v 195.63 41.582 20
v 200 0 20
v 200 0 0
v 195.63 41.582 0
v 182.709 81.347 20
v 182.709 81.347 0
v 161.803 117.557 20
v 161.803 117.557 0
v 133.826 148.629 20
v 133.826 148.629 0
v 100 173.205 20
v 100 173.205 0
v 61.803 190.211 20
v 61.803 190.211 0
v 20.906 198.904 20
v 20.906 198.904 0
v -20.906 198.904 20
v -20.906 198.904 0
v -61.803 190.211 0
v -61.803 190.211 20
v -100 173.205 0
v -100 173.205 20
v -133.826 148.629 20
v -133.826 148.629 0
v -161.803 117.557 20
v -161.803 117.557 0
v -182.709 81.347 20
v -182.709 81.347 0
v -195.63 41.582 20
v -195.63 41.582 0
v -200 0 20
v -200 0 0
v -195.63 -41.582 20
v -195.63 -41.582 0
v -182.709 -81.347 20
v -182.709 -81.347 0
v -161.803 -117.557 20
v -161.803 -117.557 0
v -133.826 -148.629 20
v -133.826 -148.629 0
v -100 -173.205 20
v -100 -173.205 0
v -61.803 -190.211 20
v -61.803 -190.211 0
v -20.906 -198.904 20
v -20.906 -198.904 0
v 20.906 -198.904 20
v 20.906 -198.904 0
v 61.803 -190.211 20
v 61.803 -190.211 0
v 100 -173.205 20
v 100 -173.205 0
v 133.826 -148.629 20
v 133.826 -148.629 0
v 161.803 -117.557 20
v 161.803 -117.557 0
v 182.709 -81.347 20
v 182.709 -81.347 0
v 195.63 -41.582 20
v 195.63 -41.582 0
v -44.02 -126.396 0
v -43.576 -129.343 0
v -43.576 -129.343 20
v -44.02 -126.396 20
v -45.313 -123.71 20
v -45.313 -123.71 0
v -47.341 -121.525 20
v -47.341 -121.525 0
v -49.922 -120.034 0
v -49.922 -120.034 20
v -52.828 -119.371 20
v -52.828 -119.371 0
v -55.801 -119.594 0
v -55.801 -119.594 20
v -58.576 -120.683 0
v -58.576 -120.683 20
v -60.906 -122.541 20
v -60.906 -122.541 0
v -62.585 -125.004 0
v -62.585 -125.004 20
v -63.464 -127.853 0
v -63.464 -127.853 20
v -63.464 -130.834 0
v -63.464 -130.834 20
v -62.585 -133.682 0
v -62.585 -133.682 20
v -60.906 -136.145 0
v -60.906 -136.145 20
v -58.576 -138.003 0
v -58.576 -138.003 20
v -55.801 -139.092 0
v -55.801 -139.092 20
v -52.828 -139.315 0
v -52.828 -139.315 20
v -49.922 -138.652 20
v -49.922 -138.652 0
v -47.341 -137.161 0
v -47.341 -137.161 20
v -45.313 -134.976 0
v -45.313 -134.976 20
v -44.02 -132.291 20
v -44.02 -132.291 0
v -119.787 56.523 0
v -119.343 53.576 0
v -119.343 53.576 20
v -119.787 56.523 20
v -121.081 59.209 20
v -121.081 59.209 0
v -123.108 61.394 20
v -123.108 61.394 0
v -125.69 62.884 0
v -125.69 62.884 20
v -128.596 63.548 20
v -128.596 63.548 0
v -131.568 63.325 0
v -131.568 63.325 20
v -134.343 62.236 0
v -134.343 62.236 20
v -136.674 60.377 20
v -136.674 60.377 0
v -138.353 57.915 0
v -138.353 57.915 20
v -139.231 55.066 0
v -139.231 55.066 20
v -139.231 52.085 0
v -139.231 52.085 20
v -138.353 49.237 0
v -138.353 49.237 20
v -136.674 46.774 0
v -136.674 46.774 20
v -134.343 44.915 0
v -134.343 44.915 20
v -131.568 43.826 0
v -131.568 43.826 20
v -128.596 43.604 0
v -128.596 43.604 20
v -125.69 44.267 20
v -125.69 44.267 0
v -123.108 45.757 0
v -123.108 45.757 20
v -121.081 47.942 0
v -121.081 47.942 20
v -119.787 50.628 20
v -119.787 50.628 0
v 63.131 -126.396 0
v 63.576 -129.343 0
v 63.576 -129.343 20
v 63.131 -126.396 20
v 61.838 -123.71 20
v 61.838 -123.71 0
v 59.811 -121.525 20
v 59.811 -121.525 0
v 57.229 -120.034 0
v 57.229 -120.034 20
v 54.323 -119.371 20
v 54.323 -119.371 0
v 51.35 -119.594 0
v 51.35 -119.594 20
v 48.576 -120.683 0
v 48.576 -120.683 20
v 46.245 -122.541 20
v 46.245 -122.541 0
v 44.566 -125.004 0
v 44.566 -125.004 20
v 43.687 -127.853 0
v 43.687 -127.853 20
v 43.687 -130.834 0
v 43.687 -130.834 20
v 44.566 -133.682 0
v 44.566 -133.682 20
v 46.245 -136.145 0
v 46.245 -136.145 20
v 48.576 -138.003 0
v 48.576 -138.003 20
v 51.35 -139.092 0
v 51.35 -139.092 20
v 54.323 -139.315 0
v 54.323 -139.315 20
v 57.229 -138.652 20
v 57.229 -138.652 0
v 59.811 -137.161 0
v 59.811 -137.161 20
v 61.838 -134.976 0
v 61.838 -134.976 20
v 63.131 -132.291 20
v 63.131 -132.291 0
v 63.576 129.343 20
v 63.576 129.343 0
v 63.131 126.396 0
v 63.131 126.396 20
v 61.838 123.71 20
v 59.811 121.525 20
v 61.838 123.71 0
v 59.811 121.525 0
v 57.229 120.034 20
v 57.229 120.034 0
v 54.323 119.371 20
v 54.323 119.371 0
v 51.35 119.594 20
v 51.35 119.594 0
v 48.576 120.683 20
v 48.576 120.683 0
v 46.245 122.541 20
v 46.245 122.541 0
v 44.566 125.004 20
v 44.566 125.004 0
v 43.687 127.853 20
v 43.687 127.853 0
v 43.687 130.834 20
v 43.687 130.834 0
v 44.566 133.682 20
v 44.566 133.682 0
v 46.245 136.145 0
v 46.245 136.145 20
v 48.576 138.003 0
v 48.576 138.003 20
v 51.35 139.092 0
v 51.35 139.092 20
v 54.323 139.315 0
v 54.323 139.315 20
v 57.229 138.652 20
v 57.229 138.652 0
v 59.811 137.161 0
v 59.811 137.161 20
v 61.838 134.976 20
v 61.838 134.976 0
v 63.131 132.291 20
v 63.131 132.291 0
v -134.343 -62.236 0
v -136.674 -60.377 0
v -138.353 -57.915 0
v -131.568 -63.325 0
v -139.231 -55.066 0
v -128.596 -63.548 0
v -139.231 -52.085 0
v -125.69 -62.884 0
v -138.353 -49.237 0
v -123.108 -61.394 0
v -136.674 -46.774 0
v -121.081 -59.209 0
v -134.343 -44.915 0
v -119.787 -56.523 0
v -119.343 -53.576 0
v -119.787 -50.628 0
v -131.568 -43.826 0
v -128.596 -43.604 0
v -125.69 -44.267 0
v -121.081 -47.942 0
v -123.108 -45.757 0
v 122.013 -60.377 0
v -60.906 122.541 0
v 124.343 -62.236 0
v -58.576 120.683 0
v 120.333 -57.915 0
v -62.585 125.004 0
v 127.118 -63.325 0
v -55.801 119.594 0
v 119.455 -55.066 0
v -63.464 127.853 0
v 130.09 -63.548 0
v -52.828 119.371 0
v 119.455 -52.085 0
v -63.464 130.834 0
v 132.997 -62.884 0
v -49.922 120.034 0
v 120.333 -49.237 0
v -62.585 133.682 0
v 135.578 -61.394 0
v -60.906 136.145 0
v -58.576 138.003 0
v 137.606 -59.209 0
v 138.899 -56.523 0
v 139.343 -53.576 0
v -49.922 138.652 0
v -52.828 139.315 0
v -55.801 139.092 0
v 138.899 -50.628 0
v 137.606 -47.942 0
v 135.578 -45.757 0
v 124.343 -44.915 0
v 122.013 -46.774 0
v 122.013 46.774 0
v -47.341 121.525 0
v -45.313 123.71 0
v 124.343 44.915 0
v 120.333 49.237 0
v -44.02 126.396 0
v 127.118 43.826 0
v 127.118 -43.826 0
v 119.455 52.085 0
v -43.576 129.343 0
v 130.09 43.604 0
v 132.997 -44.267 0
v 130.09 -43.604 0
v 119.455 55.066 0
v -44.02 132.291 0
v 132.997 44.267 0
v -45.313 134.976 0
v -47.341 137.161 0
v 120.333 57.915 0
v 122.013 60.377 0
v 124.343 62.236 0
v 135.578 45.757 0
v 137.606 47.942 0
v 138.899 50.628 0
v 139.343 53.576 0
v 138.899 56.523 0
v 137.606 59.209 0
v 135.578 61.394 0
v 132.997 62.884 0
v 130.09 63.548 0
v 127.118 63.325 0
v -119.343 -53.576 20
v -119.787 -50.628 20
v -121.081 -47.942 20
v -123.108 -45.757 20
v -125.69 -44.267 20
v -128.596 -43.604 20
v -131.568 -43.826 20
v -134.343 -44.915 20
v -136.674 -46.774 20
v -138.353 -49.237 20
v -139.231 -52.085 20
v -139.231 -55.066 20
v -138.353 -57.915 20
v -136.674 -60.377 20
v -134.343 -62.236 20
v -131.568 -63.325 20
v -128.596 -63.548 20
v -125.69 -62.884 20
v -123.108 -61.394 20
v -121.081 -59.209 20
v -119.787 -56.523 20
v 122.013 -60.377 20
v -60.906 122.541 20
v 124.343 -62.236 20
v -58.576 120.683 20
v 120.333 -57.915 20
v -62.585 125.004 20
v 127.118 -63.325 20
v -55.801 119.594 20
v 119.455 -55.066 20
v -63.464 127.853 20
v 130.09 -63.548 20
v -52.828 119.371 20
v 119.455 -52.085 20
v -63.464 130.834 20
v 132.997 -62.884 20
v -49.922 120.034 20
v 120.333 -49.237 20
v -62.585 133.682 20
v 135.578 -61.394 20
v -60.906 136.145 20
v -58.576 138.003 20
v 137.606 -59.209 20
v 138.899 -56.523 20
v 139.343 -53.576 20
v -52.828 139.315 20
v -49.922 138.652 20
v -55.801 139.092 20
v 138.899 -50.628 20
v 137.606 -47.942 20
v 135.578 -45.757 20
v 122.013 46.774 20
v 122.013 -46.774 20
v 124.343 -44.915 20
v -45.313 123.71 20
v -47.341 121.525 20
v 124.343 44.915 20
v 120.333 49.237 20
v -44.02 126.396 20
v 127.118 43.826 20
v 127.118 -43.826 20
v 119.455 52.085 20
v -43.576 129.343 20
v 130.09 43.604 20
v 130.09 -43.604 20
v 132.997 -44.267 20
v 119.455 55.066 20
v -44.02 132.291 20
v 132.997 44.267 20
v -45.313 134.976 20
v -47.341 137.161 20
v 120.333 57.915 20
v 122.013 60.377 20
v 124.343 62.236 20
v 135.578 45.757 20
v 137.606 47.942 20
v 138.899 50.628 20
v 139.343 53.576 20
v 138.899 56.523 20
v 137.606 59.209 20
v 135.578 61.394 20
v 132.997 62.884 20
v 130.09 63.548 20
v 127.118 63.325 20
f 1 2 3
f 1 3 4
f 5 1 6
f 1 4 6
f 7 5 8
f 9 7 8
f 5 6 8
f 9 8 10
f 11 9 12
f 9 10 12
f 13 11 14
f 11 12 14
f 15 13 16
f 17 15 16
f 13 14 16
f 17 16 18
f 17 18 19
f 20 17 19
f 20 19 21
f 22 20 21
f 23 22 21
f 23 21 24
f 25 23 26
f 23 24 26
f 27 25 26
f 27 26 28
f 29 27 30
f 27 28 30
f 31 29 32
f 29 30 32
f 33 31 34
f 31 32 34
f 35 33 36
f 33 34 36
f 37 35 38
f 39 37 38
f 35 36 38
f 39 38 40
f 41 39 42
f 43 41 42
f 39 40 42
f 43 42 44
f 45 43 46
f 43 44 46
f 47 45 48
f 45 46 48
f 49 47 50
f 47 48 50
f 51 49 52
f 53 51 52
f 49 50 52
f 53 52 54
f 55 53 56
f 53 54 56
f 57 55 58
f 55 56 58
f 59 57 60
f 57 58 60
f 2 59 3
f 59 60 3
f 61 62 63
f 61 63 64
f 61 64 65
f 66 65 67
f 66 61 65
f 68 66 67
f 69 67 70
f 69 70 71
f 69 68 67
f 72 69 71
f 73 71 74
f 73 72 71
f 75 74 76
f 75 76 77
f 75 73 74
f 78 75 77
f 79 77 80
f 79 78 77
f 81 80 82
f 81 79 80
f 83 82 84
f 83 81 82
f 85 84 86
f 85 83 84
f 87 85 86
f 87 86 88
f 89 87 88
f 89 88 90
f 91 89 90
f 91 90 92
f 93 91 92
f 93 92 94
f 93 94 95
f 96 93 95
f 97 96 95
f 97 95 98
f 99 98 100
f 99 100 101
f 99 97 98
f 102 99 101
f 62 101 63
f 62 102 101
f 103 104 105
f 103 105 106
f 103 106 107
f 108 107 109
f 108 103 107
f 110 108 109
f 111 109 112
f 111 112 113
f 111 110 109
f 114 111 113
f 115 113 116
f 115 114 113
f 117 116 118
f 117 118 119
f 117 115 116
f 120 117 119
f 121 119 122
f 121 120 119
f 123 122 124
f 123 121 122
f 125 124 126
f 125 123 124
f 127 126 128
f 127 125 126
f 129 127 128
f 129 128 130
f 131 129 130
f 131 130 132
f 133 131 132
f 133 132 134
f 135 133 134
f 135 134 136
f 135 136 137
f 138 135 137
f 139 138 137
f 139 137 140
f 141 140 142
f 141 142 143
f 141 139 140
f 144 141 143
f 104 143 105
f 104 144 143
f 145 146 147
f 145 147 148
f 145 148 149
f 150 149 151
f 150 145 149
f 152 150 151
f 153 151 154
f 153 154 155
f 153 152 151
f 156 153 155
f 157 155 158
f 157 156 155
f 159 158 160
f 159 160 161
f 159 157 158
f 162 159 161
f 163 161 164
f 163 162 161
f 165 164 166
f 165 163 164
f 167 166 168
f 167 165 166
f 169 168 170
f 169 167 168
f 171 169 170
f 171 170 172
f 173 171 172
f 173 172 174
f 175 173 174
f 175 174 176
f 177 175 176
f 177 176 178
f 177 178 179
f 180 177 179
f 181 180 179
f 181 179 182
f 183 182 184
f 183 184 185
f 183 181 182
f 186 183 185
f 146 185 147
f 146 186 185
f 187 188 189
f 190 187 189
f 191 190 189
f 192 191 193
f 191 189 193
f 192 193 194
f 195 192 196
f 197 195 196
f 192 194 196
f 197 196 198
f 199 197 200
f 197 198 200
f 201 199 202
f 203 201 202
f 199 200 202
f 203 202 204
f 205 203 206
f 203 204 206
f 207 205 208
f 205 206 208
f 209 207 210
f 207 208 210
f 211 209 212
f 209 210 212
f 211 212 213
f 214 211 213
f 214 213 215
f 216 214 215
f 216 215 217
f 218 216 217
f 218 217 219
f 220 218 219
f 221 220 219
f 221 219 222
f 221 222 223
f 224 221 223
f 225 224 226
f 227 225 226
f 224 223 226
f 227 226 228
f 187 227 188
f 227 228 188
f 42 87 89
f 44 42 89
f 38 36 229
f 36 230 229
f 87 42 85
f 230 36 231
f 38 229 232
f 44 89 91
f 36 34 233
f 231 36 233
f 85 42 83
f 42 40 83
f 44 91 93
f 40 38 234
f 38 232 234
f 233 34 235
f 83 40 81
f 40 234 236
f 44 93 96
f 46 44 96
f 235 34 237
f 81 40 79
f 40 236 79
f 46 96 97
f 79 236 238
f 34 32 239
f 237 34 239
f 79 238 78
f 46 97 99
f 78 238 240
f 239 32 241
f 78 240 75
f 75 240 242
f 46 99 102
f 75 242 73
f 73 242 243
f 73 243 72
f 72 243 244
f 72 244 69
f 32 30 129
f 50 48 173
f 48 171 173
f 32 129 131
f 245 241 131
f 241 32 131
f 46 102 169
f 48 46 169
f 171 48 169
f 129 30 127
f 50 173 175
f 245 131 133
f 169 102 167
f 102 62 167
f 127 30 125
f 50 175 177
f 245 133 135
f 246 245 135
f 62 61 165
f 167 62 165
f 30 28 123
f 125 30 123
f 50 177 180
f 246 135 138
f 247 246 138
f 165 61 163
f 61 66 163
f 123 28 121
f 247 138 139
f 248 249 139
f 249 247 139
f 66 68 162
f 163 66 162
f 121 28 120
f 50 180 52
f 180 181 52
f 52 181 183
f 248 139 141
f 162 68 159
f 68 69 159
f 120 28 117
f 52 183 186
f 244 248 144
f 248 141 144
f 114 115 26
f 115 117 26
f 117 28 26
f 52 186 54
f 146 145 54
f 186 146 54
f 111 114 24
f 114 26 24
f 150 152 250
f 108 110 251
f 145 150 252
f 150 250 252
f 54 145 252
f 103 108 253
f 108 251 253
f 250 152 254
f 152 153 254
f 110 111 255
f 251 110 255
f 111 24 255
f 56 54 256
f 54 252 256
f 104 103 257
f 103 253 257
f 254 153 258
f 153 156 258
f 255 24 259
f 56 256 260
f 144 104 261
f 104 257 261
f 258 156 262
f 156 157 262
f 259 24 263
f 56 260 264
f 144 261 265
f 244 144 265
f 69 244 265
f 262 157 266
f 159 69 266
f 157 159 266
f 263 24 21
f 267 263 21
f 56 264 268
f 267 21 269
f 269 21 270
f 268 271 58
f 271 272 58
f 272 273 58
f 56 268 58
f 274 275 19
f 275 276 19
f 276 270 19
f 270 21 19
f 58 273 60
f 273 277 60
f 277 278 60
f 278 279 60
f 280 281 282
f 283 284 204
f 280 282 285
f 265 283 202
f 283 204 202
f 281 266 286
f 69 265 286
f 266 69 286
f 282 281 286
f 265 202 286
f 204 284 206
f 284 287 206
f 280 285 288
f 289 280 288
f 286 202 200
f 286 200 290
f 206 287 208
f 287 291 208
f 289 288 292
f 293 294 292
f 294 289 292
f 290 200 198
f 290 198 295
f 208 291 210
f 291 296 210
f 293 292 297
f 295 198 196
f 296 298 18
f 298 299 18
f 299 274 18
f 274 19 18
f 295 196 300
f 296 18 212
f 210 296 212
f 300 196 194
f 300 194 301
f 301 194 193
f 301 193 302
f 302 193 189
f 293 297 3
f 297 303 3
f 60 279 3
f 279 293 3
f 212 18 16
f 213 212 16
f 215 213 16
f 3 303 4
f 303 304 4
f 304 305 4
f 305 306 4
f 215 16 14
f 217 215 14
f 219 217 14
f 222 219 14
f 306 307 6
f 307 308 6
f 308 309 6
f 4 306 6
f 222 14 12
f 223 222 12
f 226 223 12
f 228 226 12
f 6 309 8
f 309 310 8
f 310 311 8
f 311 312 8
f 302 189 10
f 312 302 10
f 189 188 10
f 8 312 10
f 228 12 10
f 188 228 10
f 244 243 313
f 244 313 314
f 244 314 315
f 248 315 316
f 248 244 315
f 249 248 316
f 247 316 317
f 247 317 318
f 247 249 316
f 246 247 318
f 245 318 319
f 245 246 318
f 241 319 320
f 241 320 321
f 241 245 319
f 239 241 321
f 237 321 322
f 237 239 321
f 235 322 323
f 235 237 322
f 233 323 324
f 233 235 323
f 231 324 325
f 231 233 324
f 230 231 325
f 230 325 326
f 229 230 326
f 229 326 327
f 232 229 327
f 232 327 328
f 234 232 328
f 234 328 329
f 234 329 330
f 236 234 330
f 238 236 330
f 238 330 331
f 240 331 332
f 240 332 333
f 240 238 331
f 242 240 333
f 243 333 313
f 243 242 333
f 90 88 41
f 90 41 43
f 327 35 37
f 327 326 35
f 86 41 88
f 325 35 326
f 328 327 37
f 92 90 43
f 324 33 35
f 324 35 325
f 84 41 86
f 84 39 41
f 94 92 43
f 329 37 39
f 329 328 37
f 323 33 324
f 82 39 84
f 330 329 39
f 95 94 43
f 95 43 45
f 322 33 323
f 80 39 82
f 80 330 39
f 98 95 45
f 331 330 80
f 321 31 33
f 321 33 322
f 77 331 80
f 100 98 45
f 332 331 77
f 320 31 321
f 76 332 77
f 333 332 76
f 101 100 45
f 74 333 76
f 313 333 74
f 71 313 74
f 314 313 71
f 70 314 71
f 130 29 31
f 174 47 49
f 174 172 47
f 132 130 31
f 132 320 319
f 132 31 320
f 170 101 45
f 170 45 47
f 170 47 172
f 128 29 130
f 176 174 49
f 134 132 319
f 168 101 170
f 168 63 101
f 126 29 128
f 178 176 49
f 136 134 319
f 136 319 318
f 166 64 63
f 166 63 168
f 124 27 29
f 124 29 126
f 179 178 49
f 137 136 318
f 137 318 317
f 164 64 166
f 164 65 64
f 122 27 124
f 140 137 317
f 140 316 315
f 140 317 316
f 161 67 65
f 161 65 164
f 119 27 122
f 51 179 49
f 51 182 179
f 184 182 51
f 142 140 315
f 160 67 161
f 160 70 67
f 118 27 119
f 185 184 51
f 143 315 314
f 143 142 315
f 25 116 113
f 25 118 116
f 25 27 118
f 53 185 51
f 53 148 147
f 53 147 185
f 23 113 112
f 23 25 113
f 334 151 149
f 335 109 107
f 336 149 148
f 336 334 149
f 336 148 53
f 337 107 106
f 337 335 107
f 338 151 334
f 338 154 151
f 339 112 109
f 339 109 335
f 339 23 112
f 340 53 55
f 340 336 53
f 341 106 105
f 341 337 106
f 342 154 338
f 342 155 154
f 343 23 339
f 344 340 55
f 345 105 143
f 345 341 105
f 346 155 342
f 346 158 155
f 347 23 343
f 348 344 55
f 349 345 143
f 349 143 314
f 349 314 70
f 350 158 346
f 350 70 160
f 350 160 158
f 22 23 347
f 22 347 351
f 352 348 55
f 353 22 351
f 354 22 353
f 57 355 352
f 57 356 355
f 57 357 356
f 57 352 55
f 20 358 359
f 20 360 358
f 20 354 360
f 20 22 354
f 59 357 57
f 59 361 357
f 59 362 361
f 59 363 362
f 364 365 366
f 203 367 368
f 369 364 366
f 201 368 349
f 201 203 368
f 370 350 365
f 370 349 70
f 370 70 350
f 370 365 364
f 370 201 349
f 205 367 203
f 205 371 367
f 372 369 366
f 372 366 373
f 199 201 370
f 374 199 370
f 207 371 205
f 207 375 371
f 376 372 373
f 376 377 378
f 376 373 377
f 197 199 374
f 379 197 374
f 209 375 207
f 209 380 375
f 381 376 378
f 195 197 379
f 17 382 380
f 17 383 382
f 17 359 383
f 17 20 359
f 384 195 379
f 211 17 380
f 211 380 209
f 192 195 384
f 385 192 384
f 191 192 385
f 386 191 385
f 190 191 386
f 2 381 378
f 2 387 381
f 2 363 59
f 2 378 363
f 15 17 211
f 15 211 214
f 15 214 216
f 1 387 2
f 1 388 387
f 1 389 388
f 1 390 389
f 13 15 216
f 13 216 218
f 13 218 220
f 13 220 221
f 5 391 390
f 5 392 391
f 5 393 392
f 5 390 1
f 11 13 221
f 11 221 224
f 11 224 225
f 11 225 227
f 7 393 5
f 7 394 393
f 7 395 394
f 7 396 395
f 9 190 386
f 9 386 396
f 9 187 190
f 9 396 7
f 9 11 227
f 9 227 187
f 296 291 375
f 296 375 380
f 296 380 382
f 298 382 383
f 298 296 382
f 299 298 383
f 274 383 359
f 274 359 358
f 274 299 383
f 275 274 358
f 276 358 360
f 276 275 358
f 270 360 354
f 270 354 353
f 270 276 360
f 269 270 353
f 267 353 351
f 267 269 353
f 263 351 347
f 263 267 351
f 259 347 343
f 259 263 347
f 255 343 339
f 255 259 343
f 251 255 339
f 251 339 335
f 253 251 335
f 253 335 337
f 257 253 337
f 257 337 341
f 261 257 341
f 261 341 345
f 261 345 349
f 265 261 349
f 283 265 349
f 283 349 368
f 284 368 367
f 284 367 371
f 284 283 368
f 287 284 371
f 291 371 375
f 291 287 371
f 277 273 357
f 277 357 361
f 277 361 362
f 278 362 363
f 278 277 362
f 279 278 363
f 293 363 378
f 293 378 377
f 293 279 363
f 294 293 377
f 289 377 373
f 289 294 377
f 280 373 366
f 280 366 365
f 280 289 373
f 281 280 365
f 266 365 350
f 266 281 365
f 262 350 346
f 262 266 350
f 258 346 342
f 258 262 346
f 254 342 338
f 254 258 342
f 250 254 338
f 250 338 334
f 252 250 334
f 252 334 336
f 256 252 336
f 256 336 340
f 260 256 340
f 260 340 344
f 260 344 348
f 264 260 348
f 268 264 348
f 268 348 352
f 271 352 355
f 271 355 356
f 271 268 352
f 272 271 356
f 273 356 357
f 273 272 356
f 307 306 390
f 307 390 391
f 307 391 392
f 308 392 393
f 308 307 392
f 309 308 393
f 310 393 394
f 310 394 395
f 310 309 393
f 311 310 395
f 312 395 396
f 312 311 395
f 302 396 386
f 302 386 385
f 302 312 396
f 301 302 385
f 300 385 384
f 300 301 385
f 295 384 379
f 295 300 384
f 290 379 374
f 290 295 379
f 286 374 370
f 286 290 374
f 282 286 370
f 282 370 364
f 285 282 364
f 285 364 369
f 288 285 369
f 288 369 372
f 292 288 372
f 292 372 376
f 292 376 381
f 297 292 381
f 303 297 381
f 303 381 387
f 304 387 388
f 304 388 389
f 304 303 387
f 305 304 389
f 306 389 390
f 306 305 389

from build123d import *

# Parameters (mm, degrees)
F0_R     = 200
F0_R_2   = 10
F1_DEPTH = 20


# Not quite as in the source:
# - a feature names something its author has since deleted; it is built from what else it names


with BuildPart() as f1:
    # F0 (on Top) → F1 (new body)
    with BuildSketch(Plane.XY):
        Circle(F0_R)
        with Locations((-53.5756805311, -129.3431345516)):
            Circle(F0_R_2, mode=Mode.SUBTRACT)
        with Locations((-129.3431345516, -53.5756805311)):
            Circle(F0_R_2, mode=Mode.SUBTRACT)
        with Locations((53.5756805311, -129.3431345516)):
            Circle(F0_R_2, mode=Mode.SUBTRACT)
        with Locations((129.3431345516, -53.5756805311)):
            Circle(F0_R_2, mode=Mode.SUBTRACT)
        with Locations((-129.3431345516, 53.5756805311)):
            Circle(F0_R_2, mode=Mode.SUBTRACT)
        with Locations((-53.5756805311, 129.3431345516)):
            Circle(F0_R_2, mode=Mode.SUBTRACT)
        with Locations((129.3431345516, 53.5756805311)):
            Circle(F0_R_2, mode=Mode.SUBTRACT)
        with BuildLine():
            ThreePointArc((49.7488462075, 120.1043392265), (48.0199782009, 137.6578306746), (63.5756805311, 129.3431345516))
            ThreePointArc((63.5756805311, 129.3431345516), (59.1313828613, 121.0284384286), (49.7488462075, 120.1043392265))
        make_face(mode=Mode.SUBTRACT)
    extrude(amount=F1_DEPTH)


solid = f1.part
